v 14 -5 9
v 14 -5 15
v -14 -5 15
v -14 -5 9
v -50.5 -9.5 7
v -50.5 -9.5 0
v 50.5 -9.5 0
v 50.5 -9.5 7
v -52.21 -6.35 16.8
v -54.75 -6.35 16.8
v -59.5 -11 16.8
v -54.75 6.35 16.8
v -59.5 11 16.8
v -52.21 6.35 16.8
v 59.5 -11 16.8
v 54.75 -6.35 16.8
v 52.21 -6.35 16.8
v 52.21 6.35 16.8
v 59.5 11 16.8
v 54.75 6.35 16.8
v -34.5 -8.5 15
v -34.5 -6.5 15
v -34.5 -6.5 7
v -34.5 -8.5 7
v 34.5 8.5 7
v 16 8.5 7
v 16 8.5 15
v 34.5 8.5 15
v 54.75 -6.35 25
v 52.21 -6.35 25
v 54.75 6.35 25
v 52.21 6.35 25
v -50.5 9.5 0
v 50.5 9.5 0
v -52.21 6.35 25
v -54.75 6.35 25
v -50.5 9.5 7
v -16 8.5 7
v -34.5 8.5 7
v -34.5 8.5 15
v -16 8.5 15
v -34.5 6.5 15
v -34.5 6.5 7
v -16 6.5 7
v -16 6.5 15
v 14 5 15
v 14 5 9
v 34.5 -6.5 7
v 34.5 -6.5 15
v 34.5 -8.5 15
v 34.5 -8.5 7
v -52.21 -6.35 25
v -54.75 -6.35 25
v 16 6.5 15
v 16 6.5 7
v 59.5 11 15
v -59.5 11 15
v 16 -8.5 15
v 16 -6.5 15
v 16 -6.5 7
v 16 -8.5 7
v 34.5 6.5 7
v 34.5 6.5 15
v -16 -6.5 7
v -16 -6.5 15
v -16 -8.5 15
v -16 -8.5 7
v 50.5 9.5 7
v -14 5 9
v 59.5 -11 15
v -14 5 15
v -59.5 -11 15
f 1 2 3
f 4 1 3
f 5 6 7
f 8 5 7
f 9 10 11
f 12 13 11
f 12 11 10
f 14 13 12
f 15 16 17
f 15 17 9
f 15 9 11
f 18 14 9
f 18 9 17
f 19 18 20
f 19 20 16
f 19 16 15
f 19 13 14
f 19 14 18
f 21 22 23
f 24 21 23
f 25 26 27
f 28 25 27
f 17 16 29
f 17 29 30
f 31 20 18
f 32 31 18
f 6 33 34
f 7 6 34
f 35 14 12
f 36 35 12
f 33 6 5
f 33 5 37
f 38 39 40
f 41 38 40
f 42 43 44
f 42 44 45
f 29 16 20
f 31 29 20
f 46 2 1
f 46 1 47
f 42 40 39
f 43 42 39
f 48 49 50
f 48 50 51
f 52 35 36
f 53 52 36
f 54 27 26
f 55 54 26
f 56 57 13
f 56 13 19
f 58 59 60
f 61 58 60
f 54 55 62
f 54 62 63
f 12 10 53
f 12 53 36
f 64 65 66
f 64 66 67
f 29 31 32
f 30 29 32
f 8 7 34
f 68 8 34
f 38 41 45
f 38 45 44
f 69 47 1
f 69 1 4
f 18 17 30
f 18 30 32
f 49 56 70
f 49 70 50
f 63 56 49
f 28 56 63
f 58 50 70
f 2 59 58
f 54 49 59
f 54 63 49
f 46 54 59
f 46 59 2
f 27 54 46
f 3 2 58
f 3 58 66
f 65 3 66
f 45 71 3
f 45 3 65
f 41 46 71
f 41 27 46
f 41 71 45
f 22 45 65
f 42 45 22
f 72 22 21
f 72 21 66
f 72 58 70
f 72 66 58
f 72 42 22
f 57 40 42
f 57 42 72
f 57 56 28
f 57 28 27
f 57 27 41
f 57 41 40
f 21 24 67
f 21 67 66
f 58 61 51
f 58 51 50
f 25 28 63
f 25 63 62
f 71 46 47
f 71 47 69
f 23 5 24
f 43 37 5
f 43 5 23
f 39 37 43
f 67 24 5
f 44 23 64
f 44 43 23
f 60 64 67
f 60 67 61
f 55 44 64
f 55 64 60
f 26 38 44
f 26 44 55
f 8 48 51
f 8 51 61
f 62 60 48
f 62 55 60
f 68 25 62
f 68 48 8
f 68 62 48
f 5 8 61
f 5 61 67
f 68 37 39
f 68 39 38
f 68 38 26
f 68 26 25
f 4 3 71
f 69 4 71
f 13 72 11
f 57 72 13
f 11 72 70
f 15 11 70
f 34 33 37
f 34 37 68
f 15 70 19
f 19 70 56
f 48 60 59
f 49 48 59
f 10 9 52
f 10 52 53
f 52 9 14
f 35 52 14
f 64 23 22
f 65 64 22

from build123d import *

# Parameters (mm, degrees)
ESQUISSE1_W             = 101
ESQUISSE1_H             = 19
BOSS_EXTRU_1_DEPTH      = 15
ESQUISSE2_W             = 119
ESQUISSE2_H             = 22
BOSS_EXTRU_2_DEPTH      = 1.8
ESQUISSE3_W             = 16
ESQUISSE3_H             = 8
ENL_V_MAT_EXTRU_1_DEPTH = 66.136318594
ESQUISSE4_W             = 8
ESQUISSE4_H             = 1
ESQUISSE4_H_2           = 13
ENL_V_MAT_EXTRU_2_DEPTH = 97.120965455
ESQUISSE5_W             = 28
ESQUISSE5_H             = 10
BOSS_EXTRU_3_DEPTH      = 6
ESQUISSE7_W             = 2.54
ESQUISSE7_H             = 12.7
BOSS_EXTRU_4_DEPTH      = 10


with BuildPart() as part:
    # Esquisse1 → Boss.-Extru.1 (new body)
    with BuildSketch(Plane.XY):
        Rectangle(ESQUISSE1_W, ESQUISSE1_H)
    extrude(amount=BOSS_EXTRU_1_DEPTH)

    # Esquisse2 → Boss.-Extru.2 (add)
    with BuildSketch(Plane.XY.offset(15)):
        Rectangle(ESQUISSE2_W, ESQUISSE2_H)
    extrude(amount=BOSS_EXTRU_2_DEPTH)

    # Esquisse3 → Enlèv. mat.-Extru.1 (cut, through all)
    with BuildSketch(Plane(origin=(0, 9.5, 0), x_dir=(1, 0, 0), z_dir=(0, 1, 0))):
        with Locations((-8, -11)):
            Rectangle(ESQUISSE3_W, ESQUISSE3_H)
        with Locations((8, -11)):
            Rectangle(ESQUISSE3_W, ESQUISSE3_H)
        with Locations((42.5, -11)):
            Rectangle(ESQUISSE3_W, ESQUISSE3_H)
        with Locations((-42.5, -11)):
            Rectangle(ESQUISSE3_W, ESQUISSE3_H)
    extrude(amount=-ENL_V_MAT_EXTRU_1_DEPTH, mode=Mode.SUBTRACT)

    # Esquisse4 → Enlèv. mat.-Extru.2 (cut, through all)
    with BuildSketch(Plane.ZY.offset(34.5)):
        with Locations((11, 9)):
            Rectangle(ESQUISSE4_W, ESQUISSE4_H)
        with Locations((11, 0)):
            Rectangle(ESQUISSE4_W, ESQUISSE4_H_2)
        with Locations((11, -9)):
            Rectangle(ESQUISSE4_W, ESQUISSE4_H)
    extrude(amount=-ENL_V_MAT_EXTRU_2_DEPTH, mode=Mode.SUBTRACT)

    # Esquisse5 → Boss.-Extru.3 (add)
    with BuildSketch(Plane(origin=(0, 0, 15), x_dir=(-1, 0, 0), z_dir=(0, 0, -1))):
        Rectangle(ESQUISSE5_W, ESQUISSE5_H)
    extrude(amount=BOSS_EXTRU_3_DEPTH)

    # Esquisse7 → Boss.-Extru.4 (add)
    with BuildSketch(Plane(origin=(0, 0, 15), x_dir=(-1, 0, 0), z_dir=(0, 0, -1))):
        with Locations((-53.48, 0)):
            Rectangle(ESQUISSE7_W, ESQUISSE7_H)
        with Locations((53.48, 0)):
            Rectangle(ESQUISSE7_W, ESQUISSE7_H)
    extrude(amount=-BOSS_EXTRU_4_DEPTH)


solid = part.part
